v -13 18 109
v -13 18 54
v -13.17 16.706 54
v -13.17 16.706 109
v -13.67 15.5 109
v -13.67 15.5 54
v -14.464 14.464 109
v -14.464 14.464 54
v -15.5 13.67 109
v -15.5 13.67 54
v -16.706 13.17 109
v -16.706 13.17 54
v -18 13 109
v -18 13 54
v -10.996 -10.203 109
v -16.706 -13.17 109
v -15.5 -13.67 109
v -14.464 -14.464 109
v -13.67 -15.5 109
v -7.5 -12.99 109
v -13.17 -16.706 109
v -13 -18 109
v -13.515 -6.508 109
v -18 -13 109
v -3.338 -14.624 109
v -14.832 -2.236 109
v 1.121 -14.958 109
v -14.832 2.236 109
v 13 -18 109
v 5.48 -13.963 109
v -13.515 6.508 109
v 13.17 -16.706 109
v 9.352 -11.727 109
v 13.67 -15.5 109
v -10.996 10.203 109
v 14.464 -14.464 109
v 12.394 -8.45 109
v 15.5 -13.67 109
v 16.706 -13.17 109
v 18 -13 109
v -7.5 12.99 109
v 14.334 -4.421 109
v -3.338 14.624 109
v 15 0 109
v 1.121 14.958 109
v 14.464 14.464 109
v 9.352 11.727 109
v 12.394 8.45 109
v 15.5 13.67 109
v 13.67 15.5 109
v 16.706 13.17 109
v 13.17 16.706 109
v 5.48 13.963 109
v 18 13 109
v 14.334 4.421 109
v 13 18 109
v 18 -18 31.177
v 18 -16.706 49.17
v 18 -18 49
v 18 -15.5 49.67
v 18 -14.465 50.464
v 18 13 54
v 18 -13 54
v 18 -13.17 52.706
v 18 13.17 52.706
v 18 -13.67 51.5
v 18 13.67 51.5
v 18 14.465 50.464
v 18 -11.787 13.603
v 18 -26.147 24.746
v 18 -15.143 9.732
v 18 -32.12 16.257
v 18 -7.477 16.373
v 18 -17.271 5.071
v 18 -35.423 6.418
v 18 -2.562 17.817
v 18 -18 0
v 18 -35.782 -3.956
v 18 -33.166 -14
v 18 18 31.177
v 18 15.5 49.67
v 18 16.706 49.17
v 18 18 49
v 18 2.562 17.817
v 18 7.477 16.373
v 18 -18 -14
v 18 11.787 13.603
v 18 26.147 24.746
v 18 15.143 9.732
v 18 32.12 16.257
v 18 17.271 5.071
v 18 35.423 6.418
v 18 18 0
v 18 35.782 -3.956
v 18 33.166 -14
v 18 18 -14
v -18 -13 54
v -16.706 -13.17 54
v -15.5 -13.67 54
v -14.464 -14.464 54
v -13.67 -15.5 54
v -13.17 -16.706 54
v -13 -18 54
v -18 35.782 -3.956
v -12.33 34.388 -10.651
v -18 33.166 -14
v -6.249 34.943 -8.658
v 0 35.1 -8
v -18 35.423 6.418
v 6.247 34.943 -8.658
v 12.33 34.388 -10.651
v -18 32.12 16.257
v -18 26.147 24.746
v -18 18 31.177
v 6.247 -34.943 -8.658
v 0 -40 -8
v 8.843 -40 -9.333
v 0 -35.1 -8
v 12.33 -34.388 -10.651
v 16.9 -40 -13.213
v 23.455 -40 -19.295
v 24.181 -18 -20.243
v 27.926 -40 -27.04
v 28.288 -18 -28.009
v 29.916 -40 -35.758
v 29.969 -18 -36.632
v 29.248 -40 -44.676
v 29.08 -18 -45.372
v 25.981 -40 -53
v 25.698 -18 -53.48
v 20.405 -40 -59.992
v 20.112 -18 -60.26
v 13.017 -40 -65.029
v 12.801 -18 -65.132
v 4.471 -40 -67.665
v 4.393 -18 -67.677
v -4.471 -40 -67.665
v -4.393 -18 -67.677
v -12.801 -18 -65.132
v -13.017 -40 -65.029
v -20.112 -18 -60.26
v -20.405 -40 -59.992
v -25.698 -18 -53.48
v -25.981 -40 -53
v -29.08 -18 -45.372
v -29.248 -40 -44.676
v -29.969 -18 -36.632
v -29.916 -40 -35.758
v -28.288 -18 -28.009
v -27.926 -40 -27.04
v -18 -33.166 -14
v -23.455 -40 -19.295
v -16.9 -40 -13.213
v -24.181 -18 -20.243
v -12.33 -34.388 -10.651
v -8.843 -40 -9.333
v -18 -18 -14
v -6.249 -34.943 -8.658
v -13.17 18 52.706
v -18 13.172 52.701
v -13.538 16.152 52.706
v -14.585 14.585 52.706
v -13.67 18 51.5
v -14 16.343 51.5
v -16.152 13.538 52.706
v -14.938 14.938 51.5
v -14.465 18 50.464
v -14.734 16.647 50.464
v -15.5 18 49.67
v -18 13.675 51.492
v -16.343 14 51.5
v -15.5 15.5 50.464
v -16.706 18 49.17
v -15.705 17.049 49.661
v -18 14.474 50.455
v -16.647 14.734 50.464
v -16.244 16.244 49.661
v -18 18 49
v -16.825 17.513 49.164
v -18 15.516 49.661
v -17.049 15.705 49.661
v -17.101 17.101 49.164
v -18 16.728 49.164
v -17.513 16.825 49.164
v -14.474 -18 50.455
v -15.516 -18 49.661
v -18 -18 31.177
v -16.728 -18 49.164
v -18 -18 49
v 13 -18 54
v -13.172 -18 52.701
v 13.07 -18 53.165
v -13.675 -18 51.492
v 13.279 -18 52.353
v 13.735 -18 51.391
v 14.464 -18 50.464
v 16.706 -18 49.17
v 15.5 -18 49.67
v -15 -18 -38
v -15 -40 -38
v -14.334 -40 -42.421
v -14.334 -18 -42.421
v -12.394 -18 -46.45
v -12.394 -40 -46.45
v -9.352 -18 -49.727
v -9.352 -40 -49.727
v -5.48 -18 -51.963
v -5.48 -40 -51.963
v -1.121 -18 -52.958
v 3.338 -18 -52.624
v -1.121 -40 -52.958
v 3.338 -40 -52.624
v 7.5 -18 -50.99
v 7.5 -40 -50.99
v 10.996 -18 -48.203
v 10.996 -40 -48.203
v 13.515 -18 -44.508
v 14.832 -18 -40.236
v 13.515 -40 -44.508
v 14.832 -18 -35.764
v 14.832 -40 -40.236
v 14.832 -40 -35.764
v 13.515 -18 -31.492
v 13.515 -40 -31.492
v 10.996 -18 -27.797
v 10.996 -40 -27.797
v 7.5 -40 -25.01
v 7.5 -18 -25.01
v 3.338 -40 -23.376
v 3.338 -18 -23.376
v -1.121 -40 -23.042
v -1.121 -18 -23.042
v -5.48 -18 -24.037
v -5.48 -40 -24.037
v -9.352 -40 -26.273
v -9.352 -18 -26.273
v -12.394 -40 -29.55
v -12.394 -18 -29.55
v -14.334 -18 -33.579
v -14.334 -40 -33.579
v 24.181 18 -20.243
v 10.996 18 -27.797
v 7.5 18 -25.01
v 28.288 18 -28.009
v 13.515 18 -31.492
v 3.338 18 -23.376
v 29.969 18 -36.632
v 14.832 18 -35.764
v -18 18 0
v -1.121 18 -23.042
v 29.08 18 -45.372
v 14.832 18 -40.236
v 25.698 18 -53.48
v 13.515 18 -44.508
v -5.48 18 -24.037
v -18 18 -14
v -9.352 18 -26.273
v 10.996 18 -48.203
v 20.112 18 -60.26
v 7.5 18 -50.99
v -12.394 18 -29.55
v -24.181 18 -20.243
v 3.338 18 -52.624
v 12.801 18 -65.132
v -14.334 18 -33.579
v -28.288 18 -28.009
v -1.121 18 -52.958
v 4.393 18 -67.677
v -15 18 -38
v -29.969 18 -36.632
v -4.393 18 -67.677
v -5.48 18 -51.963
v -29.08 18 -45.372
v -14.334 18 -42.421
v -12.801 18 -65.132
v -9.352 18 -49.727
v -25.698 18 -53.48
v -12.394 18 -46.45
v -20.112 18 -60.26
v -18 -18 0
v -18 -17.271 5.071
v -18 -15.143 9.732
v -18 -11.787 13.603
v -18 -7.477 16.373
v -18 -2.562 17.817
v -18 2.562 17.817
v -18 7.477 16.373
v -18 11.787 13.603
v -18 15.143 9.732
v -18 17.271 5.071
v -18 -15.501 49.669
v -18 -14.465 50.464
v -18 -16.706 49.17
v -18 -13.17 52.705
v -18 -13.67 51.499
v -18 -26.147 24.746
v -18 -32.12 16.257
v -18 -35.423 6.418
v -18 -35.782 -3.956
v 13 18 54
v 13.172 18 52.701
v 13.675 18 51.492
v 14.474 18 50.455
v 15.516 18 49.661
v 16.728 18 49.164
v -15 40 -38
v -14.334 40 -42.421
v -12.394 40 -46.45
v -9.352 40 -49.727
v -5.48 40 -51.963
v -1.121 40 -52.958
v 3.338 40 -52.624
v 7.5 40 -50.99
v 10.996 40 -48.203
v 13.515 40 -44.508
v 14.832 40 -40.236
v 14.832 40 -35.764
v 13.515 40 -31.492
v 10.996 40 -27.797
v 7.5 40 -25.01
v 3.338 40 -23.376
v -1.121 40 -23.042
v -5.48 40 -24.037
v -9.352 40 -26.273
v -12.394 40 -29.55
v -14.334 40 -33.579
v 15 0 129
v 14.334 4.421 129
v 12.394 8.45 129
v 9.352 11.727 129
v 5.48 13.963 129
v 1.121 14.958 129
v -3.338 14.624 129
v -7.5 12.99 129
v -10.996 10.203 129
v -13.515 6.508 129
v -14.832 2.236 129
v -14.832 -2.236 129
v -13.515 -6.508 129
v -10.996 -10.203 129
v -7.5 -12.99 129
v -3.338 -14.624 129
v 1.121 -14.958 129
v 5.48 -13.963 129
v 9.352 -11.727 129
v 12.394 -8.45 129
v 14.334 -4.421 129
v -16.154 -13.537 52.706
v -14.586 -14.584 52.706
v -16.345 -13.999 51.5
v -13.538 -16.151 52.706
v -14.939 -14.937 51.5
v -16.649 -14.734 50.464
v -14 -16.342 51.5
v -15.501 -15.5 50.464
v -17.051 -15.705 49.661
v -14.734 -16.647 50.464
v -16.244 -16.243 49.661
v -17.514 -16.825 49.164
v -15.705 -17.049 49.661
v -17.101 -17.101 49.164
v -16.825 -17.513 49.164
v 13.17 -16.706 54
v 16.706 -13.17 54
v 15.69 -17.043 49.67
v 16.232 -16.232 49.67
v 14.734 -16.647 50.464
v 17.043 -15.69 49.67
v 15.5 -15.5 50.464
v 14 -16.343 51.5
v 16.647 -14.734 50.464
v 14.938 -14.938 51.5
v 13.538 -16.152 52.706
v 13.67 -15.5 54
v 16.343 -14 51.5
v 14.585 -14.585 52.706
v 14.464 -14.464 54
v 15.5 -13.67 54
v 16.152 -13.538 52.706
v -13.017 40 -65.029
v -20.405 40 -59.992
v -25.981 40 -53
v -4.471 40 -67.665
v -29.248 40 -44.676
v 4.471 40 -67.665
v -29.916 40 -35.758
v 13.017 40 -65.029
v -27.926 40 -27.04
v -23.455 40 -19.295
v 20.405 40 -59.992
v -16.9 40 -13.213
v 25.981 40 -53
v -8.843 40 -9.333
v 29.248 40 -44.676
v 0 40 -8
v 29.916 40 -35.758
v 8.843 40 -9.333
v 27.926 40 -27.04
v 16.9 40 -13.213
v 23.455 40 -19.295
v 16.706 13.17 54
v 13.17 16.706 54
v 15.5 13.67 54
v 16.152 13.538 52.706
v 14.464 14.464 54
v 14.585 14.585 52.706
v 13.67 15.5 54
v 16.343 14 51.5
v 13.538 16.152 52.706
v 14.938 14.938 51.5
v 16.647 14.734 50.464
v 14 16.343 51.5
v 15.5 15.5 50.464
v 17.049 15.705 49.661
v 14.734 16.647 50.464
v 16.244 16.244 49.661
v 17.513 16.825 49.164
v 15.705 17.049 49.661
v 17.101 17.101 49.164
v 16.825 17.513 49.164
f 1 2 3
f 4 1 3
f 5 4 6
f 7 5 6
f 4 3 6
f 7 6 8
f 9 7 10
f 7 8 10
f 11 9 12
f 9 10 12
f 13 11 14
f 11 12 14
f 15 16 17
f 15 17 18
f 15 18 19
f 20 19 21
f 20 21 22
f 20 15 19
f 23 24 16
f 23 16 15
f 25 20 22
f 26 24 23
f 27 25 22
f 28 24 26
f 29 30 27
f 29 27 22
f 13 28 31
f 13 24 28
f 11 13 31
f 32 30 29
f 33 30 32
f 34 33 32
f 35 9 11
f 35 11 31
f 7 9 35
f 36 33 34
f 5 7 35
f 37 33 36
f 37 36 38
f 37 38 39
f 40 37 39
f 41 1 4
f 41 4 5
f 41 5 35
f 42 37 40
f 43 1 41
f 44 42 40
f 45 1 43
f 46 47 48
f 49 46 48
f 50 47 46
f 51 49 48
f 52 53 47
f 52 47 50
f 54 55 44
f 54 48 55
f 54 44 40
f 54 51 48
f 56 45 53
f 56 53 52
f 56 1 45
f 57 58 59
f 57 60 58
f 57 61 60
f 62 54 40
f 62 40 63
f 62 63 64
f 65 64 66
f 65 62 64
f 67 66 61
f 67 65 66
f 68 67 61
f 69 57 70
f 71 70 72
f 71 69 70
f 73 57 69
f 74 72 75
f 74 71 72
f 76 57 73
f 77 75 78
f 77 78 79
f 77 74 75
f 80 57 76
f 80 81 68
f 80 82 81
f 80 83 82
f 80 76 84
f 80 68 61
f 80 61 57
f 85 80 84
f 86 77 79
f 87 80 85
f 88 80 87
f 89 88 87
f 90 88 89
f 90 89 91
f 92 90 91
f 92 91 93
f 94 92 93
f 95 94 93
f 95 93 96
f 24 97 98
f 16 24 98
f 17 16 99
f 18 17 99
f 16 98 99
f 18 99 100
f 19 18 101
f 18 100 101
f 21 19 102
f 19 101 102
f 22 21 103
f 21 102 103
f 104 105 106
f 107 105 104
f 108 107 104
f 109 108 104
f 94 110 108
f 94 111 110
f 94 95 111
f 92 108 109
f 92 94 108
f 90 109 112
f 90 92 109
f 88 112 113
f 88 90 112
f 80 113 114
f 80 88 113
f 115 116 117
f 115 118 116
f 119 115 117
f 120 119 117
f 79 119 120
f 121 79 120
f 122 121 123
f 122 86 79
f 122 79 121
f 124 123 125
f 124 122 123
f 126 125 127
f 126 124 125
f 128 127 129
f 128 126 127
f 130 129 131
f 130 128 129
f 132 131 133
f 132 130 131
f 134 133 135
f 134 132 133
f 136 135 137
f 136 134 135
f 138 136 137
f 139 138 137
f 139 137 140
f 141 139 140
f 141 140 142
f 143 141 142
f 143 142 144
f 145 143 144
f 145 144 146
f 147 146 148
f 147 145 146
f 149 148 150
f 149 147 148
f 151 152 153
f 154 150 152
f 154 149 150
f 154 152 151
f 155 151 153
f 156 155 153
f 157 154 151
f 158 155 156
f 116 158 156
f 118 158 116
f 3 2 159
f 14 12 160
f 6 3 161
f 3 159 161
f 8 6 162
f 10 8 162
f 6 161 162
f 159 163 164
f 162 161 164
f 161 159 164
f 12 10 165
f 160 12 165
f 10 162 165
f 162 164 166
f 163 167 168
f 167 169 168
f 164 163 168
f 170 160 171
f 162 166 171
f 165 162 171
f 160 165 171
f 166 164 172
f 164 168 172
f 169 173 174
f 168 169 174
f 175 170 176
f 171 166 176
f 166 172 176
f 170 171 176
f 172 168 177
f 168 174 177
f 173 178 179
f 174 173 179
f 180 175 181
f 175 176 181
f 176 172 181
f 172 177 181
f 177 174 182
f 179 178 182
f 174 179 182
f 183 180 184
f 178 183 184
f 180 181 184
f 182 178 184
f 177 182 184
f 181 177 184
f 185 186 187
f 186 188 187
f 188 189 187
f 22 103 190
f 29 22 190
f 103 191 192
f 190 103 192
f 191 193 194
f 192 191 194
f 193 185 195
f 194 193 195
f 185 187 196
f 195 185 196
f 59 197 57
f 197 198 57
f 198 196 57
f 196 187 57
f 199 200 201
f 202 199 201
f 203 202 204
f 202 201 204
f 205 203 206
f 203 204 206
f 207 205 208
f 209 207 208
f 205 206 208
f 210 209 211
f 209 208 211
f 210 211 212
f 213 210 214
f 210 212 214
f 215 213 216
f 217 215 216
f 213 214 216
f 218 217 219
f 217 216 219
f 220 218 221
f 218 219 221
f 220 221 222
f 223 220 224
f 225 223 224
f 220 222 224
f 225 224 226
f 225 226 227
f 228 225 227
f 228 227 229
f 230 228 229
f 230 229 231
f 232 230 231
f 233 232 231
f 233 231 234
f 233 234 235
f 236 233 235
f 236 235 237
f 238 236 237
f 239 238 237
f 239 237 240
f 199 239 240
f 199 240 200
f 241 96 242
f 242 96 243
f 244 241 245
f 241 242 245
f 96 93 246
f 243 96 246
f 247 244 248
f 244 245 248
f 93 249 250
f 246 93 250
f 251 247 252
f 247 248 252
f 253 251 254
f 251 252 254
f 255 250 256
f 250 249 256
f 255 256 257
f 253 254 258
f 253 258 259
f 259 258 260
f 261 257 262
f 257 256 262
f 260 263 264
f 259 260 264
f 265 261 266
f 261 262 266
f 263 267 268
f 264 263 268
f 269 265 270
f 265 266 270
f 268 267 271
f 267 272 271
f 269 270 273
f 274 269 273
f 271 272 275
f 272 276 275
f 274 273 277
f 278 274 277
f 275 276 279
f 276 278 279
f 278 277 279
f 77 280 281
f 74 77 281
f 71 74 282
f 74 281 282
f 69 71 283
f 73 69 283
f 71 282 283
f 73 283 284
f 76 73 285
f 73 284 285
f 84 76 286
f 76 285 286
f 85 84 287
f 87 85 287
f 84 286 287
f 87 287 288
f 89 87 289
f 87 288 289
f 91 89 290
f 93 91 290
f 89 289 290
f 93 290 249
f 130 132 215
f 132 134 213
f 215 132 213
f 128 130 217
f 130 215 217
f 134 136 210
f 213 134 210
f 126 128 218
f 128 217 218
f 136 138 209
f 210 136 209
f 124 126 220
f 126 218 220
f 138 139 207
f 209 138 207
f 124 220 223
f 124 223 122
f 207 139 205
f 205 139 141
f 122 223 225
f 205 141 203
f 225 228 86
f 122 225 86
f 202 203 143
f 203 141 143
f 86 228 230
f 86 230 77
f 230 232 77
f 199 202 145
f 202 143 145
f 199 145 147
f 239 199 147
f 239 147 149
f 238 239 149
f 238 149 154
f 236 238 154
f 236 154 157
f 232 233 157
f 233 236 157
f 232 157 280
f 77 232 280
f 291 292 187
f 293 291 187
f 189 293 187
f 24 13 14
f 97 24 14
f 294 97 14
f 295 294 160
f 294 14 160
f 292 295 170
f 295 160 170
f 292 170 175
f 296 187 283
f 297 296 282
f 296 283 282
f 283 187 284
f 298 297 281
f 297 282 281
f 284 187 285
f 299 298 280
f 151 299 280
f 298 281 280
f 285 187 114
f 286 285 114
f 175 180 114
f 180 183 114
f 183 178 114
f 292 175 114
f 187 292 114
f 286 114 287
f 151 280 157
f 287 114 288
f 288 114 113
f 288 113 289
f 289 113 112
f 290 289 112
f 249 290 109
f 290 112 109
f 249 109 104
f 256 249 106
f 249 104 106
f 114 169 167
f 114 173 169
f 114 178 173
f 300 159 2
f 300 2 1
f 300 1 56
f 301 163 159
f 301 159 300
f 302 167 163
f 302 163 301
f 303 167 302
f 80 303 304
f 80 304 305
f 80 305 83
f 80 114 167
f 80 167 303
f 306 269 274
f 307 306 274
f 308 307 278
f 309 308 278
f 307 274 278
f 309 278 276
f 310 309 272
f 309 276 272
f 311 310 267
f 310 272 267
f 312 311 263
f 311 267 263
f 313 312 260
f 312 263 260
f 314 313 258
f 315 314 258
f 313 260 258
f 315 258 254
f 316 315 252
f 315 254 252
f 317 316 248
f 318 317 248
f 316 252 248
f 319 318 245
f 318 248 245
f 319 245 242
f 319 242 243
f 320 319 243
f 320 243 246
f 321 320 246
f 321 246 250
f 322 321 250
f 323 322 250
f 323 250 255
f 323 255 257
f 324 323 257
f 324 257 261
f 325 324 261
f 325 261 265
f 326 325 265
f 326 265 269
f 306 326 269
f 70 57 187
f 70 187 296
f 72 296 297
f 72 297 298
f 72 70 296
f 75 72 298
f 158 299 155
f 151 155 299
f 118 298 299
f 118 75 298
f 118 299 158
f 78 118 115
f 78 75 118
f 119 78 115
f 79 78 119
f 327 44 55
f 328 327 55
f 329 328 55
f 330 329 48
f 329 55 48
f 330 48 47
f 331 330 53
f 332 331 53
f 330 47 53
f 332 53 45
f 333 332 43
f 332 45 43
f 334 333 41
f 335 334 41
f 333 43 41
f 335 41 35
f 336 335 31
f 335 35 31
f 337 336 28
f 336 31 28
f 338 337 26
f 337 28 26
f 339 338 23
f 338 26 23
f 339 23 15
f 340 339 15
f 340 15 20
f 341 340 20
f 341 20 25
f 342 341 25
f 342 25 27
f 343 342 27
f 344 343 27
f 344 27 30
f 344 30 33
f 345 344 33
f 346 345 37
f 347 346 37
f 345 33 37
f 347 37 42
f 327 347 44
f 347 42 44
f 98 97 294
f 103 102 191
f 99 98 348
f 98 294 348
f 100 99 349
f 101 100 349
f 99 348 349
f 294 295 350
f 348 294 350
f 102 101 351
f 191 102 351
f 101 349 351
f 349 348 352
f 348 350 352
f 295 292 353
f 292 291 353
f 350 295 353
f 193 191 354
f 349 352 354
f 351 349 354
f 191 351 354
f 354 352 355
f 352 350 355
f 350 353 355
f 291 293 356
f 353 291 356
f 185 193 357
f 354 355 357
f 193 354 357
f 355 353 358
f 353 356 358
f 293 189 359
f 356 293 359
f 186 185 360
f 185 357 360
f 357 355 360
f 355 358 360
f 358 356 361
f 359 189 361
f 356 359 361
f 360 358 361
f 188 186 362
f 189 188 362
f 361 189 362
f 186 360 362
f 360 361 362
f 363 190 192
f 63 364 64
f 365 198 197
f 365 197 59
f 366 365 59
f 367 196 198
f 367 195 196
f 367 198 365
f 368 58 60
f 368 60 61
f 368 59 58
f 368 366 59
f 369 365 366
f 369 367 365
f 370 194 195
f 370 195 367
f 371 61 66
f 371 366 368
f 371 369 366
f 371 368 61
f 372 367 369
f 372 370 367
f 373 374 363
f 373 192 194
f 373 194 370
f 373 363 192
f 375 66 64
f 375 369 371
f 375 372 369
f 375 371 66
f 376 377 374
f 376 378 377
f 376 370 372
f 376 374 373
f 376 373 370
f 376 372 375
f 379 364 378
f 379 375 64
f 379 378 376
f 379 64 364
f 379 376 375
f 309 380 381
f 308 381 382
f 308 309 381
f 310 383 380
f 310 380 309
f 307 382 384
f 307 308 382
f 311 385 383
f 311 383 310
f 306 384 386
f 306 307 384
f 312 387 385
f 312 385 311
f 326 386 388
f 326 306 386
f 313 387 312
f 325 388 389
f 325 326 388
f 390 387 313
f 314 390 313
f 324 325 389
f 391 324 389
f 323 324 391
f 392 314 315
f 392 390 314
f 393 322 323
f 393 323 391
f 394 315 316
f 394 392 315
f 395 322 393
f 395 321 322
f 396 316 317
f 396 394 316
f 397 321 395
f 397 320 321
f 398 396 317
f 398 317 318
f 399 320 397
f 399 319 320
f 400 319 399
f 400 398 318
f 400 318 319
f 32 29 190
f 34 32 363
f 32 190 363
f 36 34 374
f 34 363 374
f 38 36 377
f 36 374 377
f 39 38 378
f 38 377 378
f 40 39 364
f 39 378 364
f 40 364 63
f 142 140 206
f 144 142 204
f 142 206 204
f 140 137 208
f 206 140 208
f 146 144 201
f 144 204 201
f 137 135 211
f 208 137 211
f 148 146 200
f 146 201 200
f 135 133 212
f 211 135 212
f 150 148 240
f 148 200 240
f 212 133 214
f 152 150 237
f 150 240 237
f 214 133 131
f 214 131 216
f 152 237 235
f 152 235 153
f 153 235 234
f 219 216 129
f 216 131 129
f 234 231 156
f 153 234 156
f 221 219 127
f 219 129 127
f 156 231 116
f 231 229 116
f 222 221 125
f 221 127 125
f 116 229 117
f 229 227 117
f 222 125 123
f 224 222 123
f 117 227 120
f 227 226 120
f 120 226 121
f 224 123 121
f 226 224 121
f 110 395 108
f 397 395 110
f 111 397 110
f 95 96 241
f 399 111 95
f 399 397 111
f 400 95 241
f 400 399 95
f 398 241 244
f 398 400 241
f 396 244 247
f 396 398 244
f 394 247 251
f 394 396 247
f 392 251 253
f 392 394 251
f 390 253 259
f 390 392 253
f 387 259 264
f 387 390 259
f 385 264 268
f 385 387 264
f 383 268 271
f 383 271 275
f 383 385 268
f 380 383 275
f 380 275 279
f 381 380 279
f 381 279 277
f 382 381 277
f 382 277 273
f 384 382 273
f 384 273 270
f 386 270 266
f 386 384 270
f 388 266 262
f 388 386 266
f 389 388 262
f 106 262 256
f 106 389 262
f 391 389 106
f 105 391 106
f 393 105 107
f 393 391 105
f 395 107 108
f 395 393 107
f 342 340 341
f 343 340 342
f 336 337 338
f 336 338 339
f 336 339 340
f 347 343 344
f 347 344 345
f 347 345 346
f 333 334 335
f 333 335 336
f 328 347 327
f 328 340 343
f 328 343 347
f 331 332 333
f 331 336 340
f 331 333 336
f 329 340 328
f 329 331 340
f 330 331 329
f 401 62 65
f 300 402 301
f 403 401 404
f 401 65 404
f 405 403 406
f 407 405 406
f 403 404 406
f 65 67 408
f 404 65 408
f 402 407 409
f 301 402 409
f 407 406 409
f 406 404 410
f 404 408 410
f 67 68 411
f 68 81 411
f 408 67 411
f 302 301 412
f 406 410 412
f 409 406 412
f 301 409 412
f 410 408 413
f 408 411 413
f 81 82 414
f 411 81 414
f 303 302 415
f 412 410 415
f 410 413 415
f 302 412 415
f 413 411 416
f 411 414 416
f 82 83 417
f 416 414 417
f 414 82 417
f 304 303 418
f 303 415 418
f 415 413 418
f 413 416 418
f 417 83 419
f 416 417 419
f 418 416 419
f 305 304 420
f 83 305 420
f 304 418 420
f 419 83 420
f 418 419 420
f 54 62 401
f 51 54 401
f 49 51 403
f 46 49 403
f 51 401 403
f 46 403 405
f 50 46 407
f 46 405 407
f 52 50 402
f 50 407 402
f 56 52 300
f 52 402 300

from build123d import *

# Parameters (mm, degrees)
SKETCH1_R                = 36
BOSS_EXTRUDE1_DEPTH      = 18
SKETCH2_W                = 36
SKETCH2_H                = 36
BOSS_EXTRUDE2_DEPTH      = 109
SKETCH3_R                = 15
BOSS_EXTRUDE3_DEPTH      = 20
SKETCH4_R                = 30
BOSS_EXTRUDE4_DEPTH      = 40
CUT_EXTRUDE1_DEPTH       = 139.351002938
CUT_EXTRUDE1_DEPTH_BACK  = 139.351002938
HOLE1_D                  = 30
CUT_EXTRUDE2_START       = -60
CUT_EXTRUDE2_DEPTH       = 244.926615935
FILLET1_R                = 5
CIRPATTERN1_COUNT        = 4
FILLET1_OF_CIRPATTERN1_R = 5


with BuildPart() as part:
    # Sketch1 → Boss-Extrude1 (new, symmetric)
    with BuildSketch(Plane(origin=(0, 0, 0), x_dir=(0, 0, -1), z_dir=(1, 0, 0))):
        Circle(SKETCH1_R)
    extrude(amount=BOSS_EXTRUDE1_DEPTH, both=True)

    # Sketch2 → Boss-Extrude2 (add)
    with BuildSketch(Plane.XY):
        Rectangle(SKETCH2_W, SKETCH2_H)
    extrude(amount=BOSS_EXTRUDE2_DEPTH)

    # Sketch3 → Boss-Extrude3 (add)
    with BuildSketch(Plane.XY.offset(109)):
        Circle(SKETCH3_R)
    extrude(amount=BOSS_EXTRUDE3_DEPTH)

    # Sketch4 → Boss-Extrude4 (add, symmetric)
    with BuildSketch(Plane(origin=(0, 0, 0), x_dir=(1, 0, 0), z_dir=(0, 1, 0))):
        with Locations(Location((0, 38, 0), (0, 0, 270))):
            Circle(SKETCH4_R)
    extrude(amount=BOSS_EXTRUDE4_DEPTH, both=True)

    # Sketch5 → Cut-Extrude1 (cut, two sides: drawn at the far end of the back side and taken through both)
    with BuildSketch(Plane(origin=(0, 0, 0), x_dir=(0, 0, -1), z_dir=(1, 0, 0)).offset(-CUT_EXTRUDE1_DEPTH_BACK)):
        with BuildLine():
            Line((0, 18), (68, 18))
            Line((68, 18), (68, -18))
            Line((68, -18), (0, -18))
            ThreePointArc((0, -18), (-18, 0), (0, 18))
        make_face()
    extrude(amount=CUT_EXTRUDE1_DEPTH + CUT_EXTRUDE1_DEPTH_BACK, mode=Mode.SUBTRACT)

    # Hole1 (through all)
    with Locations(Plane(origin=(0, 40, 0), x_dir=(1, 0, 0), z_dir=(0, 1, 0))):
        with Locations((0, 38)):
            Hole(HOLE1_D / 2)

    # Sketch8 → Cut-Extrude2 (cut)
    with BuildSketch(Plane.XY.offset(109).offset(CUT_EXTRUDE2_START)):
        with BuildLine():
            Line((13, 18), (18, 18))
            Line((18, 18), (18, 13))
            ThreePointArc((18, 13), (14.464466094, 14.464466094), (13, 18))
        make_face()
    cut_extrude2 = extrude(amount=CUT_EXTRUDE2_DEPTH, mode=Mode.SUBTRACT)

    # Fillet1
    fillet1_edges = [part.edges().sort_by_distance(p)[0] for p in [
        (14.464466094, 14.464466094, 49),
    ]]
    fillet(fillet1_edges, radius=FILLET1_R - 0.0001)  # a hair under: the kernel refuses the full size

    # CirPattern1: Cut-Extrude2 ×4 about axis
    cirpattern1_axis = Axis((0, 0, 0), (0, 0, 1))
    for i in range(1, CIRPATTERN1_COUNT):
        add(cut_extrude2.rotate(cirpattern1_axis, i * 360 / CIRPATTERN1_COUNT), mode=Mode.SUBTRACT)

    # Fillet1 of CirPattern1
    fillet1_of_cirpattern1_edges = [part.edges().sort_by_distance(p)[0] for p in [
        (-14.464466094, 14.464466094, 49),
        (-14.464466094, -14.464466094, 49),
        (14.464466094, -14.464466094, 49),
    ]]
    fillet(fillet1_of_cirpattern1_edges, radius=FILLET1_OF_CIRPATTERN1_R - 0.0001)  # a hair under: the kernel refuses the full size


solid = part.part
